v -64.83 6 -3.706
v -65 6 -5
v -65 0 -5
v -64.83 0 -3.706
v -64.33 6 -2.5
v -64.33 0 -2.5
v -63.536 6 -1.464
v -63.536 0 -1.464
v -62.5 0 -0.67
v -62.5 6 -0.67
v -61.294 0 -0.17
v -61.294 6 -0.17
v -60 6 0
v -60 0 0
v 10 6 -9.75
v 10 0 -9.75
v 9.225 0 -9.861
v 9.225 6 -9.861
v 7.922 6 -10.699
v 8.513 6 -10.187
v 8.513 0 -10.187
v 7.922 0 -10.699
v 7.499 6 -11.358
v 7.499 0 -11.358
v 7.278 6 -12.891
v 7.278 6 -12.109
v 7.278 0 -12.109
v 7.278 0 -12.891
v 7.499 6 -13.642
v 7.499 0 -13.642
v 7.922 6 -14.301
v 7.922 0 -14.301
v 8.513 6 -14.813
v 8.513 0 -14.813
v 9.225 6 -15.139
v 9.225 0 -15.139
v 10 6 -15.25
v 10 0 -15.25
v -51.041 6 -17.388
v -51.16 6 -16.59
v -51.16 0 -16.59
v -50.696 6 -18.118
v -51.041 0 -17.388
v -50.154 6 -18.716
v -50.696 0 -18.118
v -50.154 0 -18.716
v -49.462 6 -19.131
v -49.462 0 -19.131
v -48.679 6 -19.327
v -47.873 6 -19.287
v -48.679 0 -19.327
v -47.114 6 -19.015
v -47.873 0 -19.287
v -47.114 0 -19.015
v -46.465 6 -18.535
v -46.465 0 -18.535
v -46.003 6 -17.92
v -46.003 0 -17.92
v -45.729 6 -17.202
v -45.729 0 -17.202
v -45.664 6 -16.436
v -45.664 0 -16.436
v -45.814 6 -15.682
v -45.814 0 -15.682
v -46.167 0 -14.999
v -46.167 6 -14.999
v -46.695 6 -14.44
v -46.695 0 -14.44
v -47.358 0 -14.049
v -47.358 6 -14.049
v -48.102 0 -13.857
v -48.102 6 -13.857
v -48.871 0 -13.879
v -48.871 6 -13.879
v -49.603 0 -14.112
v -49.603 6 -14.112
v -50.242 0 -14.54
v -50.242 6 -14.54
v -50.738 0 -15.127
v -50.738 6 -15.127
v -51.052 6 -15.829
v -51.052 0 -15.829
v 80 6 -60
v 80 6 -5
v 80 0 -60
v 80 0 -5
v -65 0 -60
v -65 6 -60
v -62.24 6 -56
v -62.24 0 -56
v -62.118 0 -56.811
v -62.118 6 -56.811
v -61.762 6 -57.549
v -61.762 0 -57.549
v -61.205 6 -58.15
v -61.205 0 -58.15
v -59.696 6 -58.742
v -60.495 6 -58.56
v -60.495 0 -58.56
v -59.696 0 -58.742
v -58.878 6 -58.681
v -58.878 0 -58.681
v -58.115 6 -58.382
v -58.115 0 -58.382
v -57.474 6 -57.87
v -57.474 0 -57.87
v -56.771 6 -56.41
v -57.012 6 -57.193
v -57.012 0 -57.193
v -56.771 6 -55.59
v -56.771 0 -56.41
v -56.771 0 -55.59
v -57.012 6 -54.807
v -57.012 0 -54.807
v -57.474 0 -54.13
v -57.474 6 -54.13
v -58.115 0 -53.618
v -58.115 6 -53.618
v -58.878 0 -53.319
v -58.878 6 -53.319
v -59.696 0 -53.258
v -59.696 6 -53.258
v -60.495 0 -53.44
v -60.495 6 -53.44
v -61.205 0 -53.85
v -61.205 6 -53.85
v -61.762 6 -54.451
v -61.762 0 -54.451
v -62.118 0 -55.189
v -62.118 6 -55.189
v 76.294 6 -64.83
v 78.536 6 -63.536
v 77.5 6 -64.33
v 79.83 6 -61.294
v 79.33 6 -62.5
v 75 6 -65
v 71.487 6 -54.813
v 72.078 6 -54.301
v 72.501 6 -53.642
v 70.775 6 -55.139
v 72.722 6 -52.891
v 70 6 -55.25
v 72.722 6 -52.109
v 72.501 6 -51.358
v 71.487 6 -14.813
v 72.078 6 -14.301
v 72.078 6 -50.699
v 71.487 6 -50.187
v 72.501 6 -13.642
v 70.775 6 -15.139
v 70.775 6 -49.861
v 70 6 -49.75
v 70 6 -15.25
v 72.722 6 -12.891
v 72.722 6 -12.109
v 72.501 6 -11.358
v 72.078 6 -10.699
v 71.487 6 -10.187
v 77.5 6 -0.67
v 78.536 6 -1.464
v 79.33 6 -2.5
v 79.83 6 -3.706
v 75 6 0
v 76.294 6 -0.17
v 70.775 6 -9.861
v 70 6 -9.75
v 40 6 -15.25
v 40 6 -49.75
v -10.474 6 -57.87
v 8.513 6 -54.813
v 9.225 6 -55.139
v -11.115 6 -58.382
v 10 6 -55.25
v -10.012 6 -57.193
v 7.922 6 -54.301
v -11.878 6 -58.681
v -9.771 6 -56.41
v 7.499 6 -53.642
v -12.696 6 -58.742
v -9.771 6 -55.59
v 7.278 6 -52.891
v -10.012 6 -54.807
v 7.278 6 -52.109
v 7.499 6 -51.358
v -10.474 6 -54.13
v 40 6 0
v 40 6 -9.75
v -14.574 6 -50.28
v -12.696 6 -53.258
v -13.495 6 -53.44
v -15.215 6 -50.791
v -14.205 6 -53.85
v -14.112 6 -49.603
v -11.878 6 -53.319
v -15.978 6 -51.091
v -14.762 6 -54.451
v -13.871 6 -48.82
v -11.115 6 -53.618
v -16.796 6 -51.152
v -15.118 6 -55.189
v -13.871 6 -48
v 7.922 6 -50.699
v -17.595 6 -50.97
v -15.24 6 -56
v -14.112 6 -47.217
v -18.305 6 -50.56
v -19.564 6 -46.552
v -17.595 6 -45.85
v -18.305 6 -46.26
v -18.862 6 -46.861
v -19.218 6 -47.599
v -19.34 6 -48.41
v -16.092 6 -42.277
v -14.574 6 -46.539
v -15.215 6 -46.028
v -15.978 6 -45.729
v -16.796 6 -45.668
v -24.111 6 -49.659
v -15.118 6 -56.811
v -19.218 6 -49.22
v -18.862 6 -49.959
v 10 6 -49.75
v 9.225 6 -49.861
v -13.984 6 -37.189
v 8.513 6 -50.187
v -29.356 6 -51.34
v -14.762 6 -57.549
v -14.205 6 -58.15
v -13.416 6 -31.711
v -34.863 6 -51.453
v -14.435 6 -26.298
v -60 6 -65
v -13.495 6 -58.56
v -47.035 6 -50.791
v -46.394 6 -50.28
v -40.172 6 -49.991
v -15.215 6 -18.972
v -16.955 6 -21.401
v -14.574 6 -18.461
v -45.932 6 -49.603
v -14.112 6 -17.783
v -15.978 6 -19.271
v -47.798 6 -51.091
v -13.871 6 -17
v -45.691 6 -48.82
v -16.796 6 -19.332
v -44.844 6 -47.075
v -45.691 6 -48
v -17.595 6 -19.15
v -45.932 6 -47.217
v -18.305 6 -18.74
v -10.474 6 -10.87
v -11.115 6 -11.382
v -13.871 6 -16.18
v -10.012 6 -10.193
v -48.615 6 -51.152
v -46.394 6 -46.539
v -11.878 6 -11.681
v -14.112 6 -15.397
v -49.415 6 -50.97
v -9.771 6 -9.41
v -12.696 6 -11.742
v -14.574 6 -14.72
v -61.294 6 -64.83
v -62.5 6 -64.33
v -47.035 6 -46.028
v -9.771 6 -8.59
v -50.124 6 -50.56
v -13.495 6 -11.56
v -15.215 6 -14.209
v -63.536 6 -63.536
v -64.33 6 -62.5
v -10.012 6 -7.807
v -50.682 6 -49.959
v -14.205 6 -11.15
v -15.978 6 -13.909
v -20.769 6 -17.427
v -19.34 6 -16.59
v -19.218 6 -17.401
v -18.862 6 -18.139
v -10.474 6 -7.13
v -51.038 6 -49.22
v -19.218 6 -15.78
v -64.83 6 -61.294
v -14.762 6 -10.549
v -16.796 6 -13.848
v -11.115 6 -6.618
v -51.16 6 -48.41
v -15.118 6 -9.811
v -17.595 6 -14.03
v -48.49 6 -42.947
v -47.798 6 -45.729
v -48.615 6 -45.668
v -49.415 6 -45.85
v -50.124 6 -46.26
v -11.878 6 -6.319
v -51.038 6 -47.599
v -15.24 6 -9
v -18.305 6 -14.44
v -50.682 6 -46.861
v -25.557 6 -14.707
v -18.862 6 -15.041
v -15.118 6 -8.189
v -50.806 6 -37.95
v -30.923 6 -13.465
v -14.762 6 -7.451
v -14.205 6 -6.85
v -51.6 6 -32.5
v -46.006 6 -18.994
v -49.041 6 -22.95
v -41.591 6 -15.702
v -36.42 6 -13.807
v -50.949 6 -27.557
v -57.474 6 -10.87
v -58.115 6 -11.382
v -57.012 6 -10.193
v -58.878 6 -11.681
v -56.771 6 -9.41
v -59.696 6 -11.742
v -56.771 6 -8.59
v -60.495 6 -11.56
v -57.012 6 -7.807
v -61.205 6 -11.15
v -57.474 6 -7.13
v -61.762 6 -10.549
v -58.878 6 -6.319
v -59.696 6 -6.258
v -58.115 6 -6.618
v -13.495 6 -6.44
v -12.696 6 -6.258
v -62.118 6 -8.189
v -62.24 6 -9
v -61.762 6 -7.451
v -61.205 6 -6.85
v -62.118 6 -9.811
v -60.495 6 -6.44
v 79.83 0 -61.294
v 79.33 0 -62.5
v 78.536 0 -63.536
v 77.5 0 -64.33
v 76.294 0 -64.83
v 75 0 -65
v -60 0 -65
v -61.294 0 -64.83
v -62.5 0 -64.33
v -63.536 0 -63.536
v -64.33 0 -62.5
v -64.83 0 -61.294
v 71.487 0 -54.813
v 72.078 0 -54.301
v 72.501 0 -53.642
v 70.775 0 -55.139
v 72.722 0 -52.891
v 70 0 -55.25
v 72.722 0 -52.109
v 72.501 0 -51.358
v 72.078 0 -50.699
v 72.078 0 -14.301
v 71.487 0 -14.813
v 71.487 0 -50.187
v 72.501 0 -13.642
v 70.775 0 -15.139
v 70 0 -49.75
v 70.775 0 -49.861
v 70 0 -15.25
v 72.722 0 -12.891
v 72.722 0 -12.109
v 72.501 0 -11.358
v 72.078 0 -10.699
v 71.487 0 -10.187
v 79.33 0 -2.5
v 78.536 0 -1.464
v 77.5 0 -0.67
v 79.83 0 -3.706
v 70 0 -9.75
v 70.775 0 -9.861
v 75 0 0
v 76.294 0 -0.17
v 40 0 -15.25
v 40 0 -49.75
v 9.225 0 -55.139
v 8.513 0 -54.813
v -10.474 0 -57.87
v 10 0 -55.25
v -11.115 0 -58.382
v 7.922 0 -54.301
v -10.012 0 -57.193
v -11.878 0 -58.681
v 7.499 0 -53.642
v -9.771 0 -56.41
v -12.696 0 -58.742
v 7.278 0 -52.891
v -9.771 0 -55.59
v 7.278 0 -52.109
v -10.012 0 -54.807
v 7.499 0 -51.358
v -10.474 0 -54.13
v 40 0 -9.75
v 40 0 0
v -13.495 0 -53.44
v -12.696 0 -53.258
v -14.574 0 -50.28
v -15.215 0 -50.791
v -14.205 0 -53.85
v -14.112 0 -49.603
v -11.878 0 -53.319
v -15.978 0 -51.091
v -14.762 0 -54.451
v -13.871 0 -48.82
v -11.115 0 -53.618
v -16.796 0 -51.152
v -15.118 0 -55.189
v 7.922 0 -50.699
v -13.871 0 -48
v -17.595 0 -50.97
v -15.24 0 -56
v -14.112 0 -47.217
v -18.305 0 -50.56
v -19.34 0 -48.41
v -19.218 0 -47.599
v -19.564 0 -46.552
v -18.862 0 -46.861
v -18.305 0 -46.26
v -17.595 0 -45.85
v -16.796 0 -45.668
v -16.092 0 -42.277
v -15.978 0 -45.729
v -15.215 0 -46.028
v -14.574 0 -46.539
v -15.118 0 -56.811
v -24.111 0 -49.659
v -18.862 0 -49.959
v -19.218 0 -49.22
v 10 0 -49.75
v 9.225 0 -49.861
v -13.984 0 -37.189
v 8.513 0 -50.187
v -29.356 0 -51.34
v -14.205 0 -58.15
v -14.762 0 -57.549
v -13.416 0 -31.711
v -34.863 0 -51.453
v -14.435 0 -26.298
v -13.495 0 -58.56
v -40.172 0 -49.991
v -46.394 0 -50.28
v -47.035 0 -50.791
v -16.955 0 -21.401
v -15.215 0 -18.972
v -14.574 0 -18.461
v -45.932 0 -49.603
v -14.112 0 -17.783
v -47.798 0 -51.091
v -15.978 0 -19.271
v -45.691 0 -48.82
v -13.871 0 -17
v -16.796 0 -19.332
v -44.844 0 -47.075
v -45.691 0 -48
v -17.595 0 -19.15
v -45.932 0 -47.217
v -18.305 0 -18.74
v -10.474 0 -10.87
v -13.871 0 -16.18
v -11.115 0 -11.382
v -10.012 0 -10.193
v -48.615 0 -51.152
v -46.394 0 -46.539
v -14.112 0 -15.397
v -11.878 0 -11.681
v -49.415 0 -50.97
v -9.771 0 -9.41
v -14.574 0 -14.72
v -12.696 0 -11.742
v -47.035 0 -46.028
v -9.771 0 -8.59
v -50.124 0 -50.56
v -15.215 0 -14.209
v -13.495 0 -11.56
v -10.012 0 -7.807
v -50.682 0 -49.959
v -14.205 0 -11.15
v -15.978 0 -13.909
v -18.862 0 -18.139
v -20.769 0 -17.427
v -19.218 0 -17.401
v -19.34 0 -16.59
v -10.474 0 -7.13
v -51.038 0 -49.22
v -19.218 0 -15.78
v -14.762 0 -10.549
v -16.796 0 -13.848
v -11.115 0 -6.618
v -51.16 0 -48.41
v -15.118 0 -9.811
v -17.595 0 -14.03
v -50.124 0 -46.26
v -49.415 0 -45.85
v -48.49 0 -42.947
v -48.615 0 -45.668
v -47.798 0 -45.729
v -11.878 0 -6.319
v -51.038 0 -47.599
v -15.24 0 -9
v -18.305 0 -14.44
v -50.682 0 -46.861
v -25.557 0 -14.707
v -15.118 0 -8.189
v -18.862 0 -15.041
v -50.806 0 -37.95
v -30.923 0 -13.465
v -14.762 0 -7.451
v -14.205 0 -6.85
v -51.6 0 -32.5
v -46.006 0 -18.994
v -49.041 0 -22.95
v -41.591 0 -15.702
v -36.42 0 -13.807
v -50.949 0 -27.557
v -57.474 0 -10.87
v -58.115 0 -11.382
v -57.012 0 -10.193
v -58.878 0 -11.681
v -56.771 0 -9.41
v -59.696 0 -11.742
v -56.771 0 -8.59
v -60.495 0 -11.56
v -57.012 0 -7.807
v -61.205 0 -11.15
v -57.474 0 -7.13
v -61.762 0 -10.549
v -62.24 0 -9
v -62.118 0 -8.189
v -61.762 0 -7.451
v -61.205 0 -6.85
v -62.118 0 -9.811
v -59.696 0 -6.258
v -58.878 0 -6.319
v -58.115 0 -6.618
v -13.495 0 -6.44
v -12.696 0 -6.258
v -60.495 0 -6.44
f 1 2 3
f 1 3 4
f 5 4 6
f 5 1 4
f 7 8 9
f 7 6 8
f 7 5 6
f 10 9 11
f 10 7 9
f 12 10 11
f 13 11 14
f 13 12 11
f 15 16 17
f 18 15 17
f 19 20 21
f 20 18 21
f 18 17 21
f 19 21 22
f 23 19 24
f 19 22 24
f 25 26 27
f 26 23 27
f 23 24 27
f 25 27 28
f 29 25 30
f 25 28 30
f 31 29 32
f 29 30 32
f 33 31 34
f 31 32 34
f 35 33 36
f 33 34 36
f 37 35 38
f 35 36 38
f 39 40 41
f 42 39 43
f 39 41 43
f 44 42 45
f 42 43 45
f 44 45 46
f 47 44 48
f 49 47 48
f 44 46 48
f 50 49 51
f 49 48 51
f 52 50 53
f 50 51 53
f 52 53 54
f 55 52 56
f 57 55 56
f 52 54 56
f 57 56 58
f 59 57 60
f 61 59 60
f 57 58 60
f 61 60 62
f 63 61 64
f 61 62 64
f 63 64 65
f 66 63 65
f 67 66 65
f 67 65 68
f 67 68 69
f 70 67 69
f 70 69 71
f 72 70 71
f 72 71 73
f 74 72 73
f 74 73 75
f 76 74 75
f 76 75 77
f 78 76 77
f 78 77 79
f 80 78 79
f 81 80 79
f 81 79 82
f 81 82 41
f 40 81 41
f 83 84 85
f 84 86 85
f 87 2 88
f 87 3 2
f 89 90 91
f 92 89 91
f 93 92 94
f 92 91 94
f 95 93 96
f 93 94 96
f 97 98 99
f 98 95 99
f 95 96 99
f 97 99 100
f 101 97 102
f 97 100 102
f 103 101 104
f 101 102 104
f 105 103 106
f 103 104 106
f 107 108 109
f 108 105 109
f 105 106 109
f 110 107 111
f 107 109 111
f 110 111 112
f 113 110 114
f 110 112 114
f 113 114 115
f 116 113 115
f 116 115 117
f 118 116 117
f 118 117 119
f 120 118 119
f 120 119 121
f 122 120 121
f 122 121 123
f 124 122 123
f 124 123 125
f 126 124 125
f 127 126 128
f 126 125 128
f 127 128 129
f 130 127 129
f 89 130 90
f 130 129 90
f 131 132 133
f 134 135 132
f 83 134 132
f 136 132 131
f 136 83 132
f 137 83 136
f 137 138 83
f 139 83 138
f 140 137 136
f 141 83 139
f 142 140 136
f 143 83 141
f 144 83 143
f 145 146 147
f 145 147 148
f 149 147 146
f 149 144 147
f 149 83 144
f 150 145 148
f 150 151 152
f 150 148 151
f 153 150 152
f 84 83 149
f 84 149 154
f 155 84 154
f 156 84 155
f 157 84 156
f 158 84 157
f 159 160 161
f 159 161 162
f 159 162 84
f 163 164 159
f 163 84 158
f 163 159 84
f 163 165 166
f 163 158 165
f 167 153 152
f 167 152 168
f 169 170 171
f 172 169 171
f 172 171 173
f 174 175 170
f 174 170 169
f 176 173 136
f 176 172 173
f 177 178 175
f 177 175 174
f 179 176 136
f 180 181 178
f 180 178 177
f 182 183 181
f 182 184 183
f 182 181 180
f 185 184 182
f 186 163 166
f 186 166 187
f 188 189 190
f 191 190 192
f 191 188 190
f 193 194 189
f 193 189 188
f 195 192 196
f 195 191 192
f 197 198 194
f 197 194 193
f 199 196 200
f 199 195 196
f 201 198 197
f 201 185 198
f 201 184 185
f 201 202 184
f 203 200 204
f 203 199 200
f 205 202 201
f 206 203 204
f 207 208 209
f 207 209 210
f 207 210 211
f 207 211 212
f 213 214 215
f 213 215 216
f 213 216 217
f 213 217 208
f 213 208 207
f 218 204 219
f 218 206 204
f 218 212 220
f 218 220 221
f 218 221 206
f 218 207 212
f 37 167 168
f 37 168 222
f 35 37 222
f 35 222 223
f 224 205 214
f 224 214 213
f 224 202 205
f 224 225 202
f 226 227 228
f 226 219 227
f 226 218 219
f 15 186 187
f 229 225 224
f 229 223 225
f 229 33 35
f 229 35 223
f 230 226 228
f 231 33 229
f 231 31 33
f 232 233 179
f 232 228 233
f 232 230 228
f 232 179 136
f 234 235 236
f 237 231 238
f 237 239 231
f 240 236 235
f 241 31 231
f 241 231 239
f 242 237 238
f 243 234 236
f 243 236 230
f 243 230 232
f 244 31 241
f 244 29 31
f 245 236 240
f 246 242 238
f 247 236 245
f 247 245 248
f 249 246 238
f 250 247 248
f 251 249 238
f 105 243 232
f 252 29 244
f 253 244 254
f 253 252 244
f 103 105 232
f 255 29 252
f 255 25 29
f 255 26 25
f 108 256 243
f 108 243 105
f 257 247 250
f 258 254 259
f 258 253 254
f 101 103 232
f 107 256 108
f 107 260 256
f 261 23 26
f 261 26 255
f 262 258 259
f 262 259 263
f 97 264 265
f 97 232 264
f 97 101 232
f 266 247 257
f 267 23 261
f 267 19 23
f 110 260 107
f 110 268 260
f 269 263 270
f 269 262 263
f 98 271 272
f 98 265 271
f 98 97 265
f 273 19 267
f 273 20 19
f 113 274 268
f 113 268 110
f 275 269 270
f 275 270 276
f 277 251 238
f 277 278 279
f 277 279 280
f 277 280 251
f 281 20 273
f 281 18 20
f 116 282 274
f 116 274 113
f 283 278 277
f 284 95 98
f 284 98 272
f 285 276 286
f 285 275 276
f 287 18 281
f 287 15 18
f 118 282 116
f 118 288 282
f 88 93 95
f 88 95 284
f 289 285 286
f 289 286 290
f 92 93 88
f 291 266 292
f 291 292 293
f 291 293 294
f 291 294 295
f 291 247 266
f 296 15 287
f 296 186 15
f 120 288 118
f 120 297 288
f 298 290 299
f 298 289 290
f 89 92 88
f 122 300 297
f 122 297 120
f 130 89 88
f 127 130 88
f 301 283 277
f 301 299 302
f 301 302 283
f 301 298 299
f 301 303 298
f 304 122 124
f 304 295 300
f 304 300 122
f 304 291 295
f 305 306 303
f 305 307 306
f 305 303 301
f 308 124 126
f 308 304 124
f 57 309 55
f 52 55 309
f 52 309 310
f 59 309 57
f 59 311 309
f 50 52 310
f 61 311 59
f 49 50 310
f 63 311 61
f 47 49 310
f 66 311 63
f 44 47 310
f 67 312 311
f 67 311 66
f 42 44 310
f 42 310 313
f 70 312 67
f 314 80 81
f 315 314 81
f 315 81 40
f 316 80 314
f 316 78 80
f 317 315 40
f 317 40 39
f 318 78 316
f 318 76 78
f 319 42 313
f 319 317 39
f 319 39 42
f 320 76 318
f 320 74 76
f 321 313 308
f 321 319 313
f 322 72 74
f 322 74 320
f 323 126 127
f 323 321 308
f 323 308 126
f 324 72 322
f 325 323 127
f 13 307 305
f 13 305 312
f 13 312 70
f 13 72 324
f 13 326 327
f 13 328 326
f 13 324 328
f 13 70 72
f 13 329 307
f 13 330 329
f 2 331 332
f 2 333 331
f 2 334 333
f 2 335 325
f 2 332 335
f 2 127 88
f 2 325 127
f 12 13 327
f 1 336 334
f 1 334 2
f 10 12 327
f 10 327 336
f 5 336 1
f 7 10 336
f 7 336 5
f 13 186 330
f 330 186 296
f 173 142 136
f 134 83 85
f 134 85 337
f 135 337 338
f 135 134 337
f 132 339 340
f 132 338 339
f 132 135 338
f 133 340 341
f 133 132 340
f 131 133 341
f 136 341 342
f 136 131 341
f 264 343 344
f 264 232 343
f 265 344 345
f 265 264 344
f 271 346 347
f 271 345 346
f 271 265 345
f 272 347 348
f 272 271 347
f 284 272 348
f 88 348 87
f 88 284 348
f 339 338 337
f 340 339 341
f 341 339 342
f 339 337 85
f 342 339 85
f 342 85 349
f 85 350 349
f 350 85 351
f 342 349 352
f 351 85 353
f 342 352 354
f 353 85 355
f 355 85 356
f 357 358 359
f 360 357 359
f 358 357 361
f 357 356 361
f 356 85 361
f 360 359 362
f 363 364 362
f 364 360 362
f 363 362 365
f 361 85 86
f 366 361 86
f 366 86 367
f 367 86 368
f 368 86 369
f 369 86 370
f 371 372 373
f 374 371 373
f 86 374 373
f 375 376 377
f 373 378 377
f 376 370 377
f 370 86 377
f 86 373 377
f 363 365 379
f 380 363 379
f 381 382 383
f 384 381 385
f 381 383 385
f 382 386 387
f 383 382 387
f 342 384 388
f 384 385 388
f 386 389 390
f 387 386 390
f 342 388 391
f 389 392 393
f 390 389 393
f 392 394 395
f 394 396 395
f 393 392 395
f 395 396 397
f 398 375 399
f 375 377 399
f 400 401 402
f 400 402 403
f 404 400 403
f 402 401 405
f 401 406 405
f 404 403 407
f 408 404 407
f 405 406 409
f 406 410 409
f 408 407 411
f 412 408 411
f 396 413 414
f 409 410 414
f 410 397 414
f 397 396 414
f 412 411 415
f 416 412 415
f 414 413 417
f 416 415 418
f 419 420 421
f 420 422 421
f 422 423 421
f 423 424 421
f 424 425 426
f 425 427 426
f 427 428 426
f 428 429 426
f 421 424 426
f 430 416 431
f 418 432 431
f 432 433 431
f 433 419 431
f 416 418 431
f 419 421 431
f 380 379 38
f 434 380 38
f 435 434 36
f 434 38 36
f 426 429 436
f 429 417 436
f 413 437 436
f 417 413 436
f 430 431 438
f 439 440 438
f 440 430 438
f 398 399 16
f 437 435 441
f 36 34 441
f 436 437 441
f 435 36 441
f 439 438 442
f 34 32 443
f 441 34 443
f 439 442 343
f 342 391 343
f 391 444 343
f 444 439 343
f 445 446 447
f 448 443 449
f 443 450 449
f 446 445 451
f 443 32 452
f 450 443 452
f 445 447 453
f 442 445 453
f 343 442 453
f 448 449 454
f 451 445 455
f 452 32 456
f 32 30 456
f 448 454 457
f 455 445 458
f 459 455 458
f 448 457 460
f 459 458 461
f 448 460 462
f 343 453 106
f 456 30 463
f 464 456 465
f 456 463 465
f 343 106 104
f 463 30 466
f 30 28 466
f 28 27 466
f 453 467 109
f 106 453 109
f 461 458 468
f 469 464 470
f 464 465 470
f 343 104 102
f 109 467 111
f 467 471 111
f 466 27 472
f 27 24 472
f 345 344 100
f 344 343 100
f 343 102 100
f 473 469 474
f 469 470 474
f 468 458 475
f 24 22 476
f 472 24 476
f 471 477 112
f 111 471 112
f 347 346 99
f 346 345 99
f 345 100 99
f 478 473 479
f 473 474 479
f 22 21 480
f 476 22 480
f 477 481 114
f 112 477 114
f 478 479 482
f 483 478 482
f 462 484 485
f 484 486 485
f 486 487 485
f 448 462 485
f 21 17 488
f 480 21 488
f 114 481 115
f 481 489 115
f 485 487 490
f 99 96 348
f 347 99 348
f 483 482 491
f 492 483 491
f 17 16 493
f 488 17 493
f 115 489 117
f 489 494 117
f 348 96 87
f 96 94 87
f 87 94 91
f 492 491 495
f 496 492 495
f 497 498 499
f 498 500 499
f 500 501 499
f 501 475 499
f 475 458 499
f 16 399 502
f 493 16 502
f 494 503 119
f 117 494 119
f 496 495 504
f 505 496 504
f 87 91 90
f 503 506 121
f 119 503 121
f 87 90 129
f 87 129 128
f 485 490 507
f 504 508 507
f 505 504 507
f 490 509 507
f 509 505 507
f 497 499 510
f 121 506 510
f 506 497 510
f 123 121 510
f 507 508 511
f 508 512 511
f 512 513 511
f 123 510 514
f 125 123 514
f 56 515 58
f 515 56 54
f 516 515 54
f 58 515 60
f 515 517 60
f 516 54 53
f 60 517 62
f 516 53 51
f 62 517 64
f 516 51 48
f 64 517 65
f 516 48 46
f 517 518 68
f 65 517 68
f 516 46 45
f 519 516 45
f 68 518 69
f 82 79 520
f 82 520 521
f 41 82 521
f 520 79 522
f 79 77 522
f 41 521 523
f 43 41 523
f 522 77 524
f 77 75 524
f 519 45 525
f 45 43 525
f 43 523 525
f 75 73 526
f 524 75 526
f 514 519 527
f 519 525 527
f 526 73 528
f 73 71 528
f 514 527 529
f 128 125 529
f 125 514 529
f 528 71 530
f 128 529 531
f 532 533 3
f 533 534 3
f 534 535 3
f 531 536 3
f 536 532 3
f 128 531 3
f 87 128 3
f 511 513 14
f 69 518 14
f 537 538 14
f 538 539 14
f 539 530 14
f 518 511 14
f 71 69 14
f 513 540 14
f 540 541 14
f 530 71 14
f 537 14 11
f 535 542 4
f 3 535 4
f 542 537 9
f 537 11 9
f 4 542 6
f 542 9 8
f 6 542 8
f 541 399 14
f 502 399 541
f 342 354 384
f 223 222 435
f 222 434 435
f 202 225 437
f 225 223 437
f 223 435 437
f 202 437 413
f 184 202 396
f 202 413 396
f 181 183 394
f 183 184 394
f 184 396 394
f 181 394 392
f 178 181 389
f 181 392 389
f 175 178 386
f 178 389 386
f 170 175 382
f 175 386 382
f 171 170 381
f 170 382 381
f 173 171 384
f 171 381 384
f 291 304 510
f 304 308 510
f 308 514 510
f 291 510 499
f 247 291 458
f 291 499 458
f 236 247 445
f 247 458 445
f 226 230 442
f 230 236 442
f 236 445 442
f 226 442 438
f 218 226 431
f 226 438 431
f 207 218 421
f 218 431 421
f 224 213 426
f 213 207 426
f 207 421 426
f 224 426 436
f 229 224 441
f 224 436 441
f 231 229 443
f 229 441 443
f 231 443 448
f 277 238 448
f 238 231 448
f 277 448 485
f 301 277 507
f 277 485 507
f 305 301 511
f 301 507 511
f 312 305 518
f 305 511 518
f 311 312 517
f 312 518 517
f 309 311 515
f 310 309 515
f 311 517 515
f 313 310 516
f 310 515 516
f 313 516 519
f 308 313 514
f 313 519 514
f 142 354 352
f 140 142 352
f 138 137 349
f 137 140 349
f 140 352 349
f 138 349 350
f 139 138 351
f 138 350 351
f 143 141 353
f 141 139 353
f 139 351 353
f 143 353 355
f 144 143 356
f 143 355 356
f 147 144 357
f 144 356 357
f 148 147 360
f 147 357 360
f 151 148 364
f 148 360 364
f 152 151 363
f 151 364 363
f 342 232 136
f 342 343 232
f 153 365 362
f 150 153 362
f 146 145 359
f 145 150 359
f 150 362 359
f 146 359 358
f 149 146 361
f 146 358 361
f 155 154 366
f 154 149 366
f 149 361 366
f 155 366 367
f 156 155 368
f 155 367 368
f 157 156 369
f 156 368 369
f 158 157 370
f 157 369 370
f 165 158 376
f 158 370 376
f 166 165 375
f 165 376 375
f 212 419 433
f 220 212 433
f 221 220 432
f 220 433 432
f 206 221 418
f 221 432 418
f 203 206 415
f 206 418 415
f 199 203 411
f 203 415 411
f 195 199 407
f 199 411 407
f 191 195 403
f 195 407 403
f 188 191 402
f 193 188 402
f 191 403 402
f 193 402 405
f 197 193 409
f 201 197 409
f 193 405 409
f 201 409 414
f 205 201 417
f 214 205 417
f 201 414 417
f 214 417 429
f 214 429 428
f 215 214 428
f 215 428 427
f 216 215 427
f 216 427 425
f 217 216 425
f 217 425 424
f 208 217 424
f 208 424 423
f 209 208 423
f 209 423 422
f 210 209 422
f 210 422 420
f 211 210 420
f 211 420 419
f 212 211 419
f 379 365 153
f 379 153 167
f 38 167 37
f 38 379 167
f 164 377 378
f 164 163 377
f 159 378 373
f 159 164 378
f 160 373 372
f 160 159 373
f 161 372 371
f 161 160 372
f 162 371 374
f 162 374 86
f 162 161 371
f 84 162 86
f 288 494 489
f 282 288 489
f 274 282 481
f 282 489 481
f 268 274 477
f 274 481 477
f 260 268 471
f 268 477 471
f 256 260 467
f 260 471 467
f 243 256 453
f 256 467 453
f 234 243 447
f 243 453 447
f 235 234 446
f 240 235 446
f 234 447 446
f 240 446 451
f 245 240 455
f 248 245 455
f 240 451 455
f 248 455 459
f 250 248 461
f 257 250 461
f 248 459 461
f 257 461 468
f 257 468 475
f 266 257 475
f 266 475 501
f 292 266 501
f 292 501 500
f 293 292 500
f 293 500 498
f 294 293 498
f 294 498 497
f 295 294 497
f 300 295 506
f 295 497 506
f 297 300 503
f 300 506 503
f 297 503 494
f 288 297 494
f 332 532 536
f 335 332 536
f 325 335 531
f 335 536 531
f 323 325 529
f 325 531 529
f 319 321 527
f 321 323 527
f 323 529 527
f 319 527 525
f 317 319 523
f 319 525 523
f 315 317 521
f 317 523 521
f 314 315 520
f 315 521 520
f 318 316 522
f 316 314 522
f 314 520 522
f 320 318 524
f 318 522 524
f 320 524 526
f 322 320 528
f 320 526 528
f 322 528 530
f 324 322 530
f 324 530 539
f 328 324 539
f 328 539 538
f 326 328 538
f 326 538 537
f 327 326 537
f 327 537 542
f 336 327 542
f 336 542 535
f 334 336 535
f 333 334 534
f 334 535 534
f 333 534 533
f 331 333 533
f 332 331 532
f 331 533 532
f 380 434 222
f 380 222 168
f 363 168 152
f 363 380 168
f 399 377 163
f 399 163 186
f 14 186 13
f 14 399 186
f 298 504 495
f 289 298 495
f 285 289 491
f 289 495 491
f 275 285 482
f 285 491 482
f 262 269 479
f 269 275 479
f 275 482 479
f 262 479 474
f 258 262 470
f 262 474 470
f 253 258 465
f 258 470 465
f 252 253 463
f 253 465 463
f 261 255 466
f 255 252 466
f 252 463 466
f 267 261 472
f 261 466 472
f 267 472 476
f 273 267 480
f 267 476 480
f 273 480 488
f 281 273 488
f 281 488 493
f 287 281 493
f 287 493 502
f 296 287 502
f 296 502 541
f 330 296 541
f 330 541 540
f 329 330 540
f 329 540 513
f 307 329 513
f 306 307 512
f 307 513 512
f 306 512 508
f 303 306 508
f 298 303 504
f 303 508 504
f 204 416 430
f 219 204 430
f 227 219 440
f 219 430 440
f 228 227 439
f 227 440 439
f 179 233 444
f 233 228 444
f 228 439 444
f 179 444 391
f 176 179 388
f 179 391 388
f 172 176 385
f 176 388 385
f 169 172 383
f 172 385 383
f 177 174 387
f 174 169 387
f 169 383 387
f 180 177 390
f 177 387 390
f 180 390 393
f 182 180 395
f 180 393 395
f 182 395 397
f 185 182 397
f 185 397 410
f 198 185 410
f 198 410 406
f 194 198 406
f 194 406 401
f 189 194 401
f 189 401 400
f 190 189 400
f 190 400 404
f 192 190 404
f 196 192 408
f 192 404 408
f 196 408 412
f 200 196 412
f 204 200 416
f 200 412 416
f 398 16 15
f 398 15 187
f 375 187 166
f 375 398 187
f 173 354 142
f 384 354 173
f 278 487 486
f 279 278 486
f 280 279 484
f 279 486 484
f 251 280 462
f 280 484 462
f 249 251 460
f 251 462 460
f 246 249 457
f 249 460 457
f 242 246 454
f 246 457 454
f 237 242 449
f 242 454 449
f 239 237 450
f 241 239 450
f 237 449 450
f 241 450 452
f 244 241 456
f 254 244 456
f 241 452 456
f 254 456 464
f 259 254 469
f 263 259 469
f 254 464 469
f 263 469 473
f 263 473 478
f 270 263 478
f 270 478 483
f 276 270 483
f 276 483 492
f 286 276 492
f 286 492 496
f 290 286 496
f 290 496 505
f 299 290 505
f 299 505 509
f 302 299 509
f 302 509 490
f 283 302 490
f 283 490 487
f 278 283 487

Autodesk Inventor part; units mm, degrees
ref_plane "YZ Plane" through (0, 0, 0) normal (1, 0, 0) x (0, 1, 0)
ref_plane "XZ Plane" through (0, 0, 0) normal (0, 1, 0) x (-1, 0, 0)
ref_plane "XY Plane" through (0, 0, 0) normal (0, 0, 1) x (1, 0, 0)
sketch "Sketch1" plane through (0, 0, 0) normal (0, 1, 0) x (-1, 0, 0)
  line L0 (0, 0) -> (65, 0)
  line L1 (65, 0) -> (65, -65)
  line L2 (65, -65) -> (0, -65)
  line L3 (0, -65) -> (0, 0)
  line L4 (0, 0) -> (-80, 0)
  line L5 (-80, 0) -> (-80, -65)
  line L6 (-80, -65) -> (0, -65)
  line L7 (0, -65) -> (0, 0)
  circle A0 centre (59.49, -9) radius 2.75
  circle A1 centre (59.49, -56) radius 2.75
  circle A2 centre (12.49, -9) radius 2.75
  circle A3 centre (12.49, -56) radius 2.75
  line L8 (-40, 0) -> (-40, -12.5)
  line L9 (-40, -12.5) -> (-40, -52.5)
  line L10 (-70, -12.5) -> (-10, -12.5) construction
  line L11 (-70, -15.25) -> (-10, -15.25)
  line L12 (-10, -9.75) -> (-70, -9.75)
  arc A4 (-70, -9.75) -> (-70, -15.25) centre (-70, -12.5) ccw
  arc A5 (-10, -15.25) -> (-10, -9.75) centre (-10, -12.5) ccw
  line L13 (-70, -52.5) -> (-10, -52.5) construction
  line L14 (-70, -55.25) -> (-10, -55.25)
  line L15 (-10, -49.75) -> (-70, -49.75)
  arc A6 (-70, -49.75) -> (-70, -55.25) centre (-70, -52.5) ccw
  arc A7 (-10, -55.25) -> (-10, -49.75) centre (-10, -52.5) ccw
  line L16 (-40, -52.5) -> (20, -52.5) construction
  circle A8 centre (32.5, -32.5) radius 22.5
  line L17 (32.5, -32.5) -> (48.4099, -16.5901)
  line L18 (32.5, -32.5) -> (55, -32.5) construction
  circle A9 centre (48.4099, -16.5901) radius 2.75
  circle A10 centre (16.5901, -16.5901) radius 2.75
  circle A11 centre (16.5901, -48.4099) radius 2.75
  circle A12 centre (48.4099, -48.4099) radius 2.75
  circle A13 centre (32.5, -32.5) radius 19.1
  dimension "d31" = 45
  dimension "d0" = 65
  dimension "d1" = 65
  dimension "d2" = 80
  dimension "d3" = 65
  dimension "d4" = 5.5
  dimension "d5" = 5.51
  dimension "d6" = 9
  dimension "d9" = 47
  dimension "d12" = 47
  dimension "d15" = 12.5
  dimension "d16" = 40
  dimension "d17" = 30
  dimension "d18" = 5.5
  dimension "d19" = 30
  dimension "d20" = 0
  dimension "d21" = 5.5
  dimension "d32" = 32.5
  dimension "d33" = 32.5
  dimension "d34" = 45
  dimension "d35" = 5.5
  dimension "d38" = 360
  dimension "d40" = 38.2
extrude "Extrusion3" add sketch "Sketch1" along normal blind 6 contours L0 L1 L2 L3 | L3 L6 L5 L4 | A8 A12 A11 A10 A9
fillet "Fillet3" radius 5 4 edges at (-65, 3, 0) (-65, 3, -65) (80, 3, -65) (80, 3, 0)
properties part number "NEMA23_FaceMount"
